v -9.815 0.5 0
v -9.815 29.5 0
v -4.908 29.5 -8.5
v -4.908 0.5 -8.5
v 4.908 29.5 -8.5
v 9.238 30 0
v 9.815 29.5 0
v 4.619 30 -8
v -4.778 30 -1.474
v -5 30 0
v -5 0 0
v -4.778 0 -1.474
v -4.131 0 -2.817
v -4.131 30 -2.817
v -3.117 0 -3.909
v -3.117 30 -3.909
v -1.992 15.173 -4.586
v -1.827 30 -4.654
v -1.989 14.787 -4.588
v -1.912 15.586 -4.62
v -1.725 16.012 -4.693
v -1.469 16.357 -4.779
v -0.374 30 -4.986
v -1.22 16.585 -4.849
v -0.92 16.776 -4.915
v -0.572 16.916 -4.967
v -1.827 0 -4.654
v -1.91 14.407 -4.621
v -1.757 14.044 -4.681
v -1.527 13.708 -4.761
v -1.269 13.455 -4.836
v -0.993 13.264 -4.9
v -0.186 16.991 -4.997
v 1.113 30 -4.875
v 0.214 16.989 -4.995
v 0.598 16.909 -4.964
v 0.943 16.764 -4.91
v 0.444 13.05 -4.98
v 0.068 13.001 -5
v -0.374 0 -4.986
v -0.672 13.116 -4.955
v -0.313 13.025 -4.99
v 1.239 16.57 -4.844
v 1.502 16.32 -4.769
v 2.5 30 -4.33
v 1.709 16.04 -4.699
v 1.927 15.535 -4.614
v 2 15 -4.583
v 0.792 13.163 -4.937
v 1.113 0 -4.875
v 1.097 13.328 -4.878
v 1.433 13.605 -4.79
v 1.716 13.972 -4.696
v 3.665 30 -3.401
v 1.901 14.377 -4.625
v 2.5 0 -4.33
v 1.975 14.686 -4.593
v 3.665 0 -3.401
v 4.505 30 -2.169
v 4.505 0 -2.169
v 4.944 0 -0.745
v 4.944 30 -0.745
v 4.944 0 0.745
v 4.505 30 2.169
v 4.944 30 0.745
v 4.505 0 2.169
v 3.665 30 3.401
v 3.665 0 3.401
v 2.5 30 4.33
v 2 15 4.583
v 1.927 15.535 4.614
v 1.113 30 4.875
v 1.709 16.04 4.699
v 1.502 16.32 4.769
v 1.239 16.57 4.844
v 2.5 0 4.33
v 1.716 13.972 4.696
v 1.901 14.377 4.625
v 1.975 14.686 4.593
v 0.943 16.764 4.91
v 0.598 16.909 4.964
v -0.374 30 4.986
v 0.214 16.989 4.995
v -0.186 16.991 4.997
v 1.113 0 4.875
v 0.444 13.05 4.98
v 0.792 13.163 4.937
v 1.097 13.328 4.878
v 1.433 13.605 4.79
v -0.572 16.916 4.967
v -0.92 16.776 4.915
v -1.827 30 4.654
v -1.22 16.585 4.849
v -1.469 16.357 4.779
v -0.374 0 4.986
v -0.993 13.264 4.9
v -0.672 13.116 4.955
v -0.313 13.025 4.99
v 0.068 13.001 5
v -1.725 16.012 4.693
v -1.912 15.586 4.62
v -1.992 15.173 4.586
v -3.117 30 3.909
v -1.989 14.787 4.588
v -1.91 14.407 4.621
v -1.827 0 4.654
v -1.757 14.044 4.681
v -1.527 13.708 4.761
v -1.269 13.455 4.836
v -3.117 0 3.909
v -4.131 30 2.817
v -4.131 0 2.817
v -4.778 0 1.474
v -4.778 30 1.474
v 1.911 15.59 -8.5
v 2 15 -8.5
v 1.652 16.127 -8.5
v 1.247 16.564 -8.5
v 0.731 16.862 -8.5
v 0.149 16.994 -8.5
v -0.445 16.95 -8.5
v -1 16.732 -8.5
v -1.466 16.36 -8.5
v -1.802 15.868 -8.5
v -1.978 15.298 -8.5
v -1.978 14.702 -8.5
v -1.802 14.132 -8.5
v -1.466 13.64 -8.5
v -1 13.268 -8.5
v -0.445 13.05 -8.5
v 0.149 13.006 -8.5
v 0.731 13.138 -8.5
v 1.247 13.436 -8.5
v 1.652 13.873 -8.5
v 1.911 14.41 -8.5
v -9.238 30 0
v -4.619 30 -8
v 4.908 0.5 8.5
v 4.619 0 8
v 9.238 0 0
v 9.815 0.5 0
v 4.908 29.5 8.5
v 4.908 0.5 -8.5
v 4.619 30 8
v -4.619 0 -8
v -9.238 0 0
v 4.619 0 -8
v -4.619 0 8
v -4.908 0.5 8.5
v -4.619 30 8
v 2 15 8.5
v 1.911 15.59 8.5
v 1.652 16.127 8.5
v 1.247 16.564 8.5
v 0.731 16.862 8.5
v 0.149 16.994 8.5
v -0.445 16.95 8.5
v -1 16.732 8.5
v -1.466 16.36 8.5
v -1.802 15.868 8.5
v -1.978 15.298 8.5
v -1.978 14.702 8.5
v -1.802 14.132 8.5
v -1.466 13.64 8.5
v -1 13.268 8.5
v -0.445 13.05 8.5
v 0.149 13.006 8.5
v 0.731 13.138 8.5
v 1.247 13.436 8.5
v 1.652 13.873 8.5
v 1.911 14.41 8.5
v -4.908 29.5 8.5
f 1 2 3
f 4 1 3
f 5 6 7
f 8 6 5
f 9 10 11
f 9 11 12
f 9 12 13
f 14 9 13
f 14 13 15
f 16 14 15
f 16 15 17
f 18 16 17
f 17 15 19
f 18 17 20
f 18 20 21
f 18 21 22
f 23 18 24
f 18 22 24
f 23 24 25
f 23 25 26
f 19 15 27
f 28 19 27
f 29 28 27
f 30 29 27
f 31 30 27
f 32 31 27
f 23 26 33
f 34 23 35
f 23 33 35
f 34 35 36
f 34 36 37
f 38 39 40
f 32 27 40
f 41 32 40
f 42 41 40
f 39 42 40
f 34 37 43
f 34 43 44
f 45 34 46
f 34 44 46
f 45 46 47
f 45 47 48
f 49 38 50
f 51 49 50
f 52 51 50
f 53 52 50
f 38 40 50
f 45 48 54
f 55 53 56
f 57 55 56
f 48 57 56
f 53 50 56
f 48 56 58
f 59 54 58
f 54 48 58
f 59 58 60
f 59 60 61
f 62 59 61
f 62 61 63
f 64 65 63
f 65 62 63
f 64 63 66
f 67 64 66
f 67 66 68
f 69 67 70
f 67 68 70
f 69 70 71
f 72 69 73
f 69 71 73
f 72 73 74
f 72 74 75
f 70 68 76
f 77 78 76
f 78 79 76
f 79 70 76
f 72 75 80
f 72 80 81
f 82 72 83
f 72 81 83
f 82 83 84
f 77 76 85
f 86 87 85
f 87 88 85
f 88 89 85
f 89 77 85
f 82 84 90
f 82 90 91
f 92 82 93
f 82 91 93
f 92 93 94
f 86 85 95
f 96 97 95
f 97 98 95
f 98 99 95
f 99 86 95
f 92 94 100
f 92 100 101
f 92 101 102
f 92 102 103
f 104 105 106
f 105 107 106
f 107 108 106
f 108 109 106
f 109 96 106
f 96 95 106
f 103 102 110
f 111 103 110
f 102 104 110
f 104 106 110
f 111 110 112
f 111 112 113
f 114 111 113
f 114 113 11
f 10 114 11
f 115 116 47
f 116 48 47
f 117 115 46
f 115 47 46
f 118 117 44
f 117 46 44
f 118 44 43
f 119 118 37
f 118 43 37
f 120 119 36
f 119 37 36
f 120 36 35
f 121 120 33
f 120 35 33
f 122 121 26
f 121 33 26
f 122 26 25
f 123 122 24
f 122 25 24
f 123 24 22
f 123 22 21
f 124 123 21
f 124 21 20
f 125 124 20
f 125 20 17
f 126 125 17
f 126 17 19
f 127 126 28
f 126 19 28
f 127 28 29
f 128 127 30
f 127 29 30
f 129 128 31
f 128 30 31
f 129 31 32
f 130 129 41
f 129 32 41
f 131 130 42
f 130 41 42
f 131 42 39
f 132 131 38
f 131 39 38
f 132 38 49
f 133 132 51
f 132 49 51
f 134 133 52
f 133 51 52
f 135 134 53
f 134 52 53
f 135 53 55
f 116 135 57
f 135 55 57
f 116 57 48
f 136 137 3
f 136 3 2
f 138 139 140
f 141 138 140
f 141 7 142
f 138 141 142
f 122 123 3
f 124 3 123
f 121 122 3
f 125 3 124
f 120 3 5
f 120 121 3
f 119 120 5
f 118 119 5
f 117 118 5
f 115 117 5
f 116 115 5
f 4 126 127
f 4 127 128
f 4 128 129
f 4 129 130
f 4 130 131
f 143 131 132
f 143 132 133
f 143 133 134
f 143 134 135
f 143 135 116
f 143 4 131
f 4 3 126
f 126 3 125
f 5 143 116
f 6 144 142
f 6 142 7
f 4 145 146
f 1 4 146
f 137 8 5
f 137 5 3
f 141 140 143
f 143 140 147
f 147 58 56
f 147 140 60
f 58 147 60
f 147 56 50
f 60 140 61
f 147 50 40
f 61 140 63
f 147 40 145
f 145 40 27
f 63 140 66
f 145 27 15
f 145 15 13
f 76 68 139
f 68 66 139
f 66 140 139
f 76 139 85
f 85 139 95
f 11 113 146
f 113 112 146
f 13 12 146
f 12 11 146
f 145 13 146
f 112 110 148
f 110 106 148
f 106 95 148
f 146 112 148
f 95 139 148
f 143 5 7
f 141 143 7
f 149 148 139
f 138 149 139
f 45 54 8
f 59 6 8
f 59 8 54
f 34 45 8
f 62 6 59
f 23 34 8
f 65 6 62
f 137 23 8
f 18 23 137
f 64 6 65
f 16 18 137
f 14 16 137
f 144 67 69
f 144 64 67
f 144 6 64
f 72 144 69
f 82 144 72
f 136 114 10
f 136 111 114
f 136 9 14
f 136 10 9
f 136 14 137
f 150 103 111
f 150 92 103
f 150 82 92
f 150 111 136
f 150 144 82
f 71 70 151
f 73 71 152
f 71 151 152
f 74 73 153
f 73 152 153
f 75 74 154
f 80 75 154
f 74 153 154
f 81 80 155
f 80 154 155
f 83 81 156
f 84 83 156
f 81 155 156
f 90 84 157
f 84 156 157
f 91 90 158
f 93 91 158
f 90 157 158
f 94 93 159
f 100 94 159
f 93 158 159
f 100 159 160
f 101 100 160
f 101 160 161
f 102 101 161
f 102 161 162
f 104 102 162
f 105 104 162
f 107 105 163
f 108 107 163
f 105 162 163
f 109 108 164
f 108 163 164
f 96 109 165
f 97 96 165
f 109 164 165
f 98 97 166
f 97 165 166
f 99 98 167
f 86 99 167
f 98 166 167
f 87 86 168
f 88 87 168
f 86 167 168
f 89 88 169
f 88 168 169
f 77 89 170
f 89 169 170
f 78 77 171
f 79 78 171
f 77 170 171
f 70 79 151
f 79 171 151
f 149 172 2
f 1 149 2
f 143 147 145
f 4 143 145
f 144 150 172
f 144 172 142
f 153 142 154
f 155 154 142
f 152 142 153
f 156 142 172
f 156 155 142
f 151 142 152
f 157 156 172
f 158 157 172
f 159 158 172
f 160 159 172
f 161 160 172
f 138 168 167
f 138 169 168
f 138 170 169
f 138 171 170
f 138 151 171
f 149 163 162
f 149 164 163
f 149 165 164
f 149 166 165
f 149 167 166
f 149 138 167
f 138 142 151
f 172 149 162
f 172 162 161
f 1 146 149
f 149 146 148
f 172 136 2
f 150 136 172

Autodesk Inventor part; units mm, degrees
ref_plane "YZ Plane" through (0, 0, 0) normal (1, 0, 0) x (0, 1, 0)
ref_plane "XZ Plane" through (0, 0, 0) normal (0, 1, 0) x (-1, 0, 0)
ref_plane "XY Plane" through (0, 0, 0) normal (0, 0, 1) x (1, 0, 0)
sketch "Sketch1" plane through (0, 0, 0) normal (0, 1, 0) x (-1, 0, 0)
  circle A0 centre (0, 0) radius 5
  line L0 (9.815, 0) -> (4.9075, -8.5)
  line L1 (4.9075, -8.5) -> (-4.9075, -8.5)
  line L2 (-4.9075, -8.5) -> (-9.815, 0)
  line L3 (-9.815, 0) -> (-4.9075, 8.5)
  line L4 (-4.9075, 8.5) -> (4.9075, 8.5)
  line L5 (4.9075, 8.5) -> (9.815, 0)
  dimension "d0" = 10
  dimension "d1" = 17
extrude "Extrusion1" add sketch "Sketch1" along normal blind 30
chamfer "Chamfer1" distance 0.5 angle 45 12 edges at (7.3612, 0, 4.25) (0, 0, 8.5) (-7.3612, 0, 4.25) (-7.3612, 0, -4.25) (0, 0, -8.5) (7.3612, 0, -4.25) (7.3612, 30, -4.25) (7.3612, 30, 4.25) (0, 30, 8.5) (-7.3612, 30, 4.25) (-7.3612, 30, -4.25) (0, 30, -8.5)
thread "Thread1" size "M10x1.5" class "6H" standard "ANSI Metric M Profile" full length
sketch "Sketch2" plane through (-4.9075, 29.5, 8.5) normal (0, 0, 1) x (1, 0, 0)
  circle A0 centre (4.9075, -14.5) radius 2
  point P0 (4.9075, -29.5)
  dimension "d9" = 4
  dimension "d10" = 15
extrude "Extrusion2" cut sketch "Sketch2" against normal blind 26.75
thread "Thread2" size "M4x0.7" class "6H" standard "ANSI Metric M Profile" full length
thread "Thread3" size "M4x0.7" class "6H" standard "ANSI Metric M Profile" full length
properties part number "КВ33.000.105 - Каретка" material "Iron, Cast"
